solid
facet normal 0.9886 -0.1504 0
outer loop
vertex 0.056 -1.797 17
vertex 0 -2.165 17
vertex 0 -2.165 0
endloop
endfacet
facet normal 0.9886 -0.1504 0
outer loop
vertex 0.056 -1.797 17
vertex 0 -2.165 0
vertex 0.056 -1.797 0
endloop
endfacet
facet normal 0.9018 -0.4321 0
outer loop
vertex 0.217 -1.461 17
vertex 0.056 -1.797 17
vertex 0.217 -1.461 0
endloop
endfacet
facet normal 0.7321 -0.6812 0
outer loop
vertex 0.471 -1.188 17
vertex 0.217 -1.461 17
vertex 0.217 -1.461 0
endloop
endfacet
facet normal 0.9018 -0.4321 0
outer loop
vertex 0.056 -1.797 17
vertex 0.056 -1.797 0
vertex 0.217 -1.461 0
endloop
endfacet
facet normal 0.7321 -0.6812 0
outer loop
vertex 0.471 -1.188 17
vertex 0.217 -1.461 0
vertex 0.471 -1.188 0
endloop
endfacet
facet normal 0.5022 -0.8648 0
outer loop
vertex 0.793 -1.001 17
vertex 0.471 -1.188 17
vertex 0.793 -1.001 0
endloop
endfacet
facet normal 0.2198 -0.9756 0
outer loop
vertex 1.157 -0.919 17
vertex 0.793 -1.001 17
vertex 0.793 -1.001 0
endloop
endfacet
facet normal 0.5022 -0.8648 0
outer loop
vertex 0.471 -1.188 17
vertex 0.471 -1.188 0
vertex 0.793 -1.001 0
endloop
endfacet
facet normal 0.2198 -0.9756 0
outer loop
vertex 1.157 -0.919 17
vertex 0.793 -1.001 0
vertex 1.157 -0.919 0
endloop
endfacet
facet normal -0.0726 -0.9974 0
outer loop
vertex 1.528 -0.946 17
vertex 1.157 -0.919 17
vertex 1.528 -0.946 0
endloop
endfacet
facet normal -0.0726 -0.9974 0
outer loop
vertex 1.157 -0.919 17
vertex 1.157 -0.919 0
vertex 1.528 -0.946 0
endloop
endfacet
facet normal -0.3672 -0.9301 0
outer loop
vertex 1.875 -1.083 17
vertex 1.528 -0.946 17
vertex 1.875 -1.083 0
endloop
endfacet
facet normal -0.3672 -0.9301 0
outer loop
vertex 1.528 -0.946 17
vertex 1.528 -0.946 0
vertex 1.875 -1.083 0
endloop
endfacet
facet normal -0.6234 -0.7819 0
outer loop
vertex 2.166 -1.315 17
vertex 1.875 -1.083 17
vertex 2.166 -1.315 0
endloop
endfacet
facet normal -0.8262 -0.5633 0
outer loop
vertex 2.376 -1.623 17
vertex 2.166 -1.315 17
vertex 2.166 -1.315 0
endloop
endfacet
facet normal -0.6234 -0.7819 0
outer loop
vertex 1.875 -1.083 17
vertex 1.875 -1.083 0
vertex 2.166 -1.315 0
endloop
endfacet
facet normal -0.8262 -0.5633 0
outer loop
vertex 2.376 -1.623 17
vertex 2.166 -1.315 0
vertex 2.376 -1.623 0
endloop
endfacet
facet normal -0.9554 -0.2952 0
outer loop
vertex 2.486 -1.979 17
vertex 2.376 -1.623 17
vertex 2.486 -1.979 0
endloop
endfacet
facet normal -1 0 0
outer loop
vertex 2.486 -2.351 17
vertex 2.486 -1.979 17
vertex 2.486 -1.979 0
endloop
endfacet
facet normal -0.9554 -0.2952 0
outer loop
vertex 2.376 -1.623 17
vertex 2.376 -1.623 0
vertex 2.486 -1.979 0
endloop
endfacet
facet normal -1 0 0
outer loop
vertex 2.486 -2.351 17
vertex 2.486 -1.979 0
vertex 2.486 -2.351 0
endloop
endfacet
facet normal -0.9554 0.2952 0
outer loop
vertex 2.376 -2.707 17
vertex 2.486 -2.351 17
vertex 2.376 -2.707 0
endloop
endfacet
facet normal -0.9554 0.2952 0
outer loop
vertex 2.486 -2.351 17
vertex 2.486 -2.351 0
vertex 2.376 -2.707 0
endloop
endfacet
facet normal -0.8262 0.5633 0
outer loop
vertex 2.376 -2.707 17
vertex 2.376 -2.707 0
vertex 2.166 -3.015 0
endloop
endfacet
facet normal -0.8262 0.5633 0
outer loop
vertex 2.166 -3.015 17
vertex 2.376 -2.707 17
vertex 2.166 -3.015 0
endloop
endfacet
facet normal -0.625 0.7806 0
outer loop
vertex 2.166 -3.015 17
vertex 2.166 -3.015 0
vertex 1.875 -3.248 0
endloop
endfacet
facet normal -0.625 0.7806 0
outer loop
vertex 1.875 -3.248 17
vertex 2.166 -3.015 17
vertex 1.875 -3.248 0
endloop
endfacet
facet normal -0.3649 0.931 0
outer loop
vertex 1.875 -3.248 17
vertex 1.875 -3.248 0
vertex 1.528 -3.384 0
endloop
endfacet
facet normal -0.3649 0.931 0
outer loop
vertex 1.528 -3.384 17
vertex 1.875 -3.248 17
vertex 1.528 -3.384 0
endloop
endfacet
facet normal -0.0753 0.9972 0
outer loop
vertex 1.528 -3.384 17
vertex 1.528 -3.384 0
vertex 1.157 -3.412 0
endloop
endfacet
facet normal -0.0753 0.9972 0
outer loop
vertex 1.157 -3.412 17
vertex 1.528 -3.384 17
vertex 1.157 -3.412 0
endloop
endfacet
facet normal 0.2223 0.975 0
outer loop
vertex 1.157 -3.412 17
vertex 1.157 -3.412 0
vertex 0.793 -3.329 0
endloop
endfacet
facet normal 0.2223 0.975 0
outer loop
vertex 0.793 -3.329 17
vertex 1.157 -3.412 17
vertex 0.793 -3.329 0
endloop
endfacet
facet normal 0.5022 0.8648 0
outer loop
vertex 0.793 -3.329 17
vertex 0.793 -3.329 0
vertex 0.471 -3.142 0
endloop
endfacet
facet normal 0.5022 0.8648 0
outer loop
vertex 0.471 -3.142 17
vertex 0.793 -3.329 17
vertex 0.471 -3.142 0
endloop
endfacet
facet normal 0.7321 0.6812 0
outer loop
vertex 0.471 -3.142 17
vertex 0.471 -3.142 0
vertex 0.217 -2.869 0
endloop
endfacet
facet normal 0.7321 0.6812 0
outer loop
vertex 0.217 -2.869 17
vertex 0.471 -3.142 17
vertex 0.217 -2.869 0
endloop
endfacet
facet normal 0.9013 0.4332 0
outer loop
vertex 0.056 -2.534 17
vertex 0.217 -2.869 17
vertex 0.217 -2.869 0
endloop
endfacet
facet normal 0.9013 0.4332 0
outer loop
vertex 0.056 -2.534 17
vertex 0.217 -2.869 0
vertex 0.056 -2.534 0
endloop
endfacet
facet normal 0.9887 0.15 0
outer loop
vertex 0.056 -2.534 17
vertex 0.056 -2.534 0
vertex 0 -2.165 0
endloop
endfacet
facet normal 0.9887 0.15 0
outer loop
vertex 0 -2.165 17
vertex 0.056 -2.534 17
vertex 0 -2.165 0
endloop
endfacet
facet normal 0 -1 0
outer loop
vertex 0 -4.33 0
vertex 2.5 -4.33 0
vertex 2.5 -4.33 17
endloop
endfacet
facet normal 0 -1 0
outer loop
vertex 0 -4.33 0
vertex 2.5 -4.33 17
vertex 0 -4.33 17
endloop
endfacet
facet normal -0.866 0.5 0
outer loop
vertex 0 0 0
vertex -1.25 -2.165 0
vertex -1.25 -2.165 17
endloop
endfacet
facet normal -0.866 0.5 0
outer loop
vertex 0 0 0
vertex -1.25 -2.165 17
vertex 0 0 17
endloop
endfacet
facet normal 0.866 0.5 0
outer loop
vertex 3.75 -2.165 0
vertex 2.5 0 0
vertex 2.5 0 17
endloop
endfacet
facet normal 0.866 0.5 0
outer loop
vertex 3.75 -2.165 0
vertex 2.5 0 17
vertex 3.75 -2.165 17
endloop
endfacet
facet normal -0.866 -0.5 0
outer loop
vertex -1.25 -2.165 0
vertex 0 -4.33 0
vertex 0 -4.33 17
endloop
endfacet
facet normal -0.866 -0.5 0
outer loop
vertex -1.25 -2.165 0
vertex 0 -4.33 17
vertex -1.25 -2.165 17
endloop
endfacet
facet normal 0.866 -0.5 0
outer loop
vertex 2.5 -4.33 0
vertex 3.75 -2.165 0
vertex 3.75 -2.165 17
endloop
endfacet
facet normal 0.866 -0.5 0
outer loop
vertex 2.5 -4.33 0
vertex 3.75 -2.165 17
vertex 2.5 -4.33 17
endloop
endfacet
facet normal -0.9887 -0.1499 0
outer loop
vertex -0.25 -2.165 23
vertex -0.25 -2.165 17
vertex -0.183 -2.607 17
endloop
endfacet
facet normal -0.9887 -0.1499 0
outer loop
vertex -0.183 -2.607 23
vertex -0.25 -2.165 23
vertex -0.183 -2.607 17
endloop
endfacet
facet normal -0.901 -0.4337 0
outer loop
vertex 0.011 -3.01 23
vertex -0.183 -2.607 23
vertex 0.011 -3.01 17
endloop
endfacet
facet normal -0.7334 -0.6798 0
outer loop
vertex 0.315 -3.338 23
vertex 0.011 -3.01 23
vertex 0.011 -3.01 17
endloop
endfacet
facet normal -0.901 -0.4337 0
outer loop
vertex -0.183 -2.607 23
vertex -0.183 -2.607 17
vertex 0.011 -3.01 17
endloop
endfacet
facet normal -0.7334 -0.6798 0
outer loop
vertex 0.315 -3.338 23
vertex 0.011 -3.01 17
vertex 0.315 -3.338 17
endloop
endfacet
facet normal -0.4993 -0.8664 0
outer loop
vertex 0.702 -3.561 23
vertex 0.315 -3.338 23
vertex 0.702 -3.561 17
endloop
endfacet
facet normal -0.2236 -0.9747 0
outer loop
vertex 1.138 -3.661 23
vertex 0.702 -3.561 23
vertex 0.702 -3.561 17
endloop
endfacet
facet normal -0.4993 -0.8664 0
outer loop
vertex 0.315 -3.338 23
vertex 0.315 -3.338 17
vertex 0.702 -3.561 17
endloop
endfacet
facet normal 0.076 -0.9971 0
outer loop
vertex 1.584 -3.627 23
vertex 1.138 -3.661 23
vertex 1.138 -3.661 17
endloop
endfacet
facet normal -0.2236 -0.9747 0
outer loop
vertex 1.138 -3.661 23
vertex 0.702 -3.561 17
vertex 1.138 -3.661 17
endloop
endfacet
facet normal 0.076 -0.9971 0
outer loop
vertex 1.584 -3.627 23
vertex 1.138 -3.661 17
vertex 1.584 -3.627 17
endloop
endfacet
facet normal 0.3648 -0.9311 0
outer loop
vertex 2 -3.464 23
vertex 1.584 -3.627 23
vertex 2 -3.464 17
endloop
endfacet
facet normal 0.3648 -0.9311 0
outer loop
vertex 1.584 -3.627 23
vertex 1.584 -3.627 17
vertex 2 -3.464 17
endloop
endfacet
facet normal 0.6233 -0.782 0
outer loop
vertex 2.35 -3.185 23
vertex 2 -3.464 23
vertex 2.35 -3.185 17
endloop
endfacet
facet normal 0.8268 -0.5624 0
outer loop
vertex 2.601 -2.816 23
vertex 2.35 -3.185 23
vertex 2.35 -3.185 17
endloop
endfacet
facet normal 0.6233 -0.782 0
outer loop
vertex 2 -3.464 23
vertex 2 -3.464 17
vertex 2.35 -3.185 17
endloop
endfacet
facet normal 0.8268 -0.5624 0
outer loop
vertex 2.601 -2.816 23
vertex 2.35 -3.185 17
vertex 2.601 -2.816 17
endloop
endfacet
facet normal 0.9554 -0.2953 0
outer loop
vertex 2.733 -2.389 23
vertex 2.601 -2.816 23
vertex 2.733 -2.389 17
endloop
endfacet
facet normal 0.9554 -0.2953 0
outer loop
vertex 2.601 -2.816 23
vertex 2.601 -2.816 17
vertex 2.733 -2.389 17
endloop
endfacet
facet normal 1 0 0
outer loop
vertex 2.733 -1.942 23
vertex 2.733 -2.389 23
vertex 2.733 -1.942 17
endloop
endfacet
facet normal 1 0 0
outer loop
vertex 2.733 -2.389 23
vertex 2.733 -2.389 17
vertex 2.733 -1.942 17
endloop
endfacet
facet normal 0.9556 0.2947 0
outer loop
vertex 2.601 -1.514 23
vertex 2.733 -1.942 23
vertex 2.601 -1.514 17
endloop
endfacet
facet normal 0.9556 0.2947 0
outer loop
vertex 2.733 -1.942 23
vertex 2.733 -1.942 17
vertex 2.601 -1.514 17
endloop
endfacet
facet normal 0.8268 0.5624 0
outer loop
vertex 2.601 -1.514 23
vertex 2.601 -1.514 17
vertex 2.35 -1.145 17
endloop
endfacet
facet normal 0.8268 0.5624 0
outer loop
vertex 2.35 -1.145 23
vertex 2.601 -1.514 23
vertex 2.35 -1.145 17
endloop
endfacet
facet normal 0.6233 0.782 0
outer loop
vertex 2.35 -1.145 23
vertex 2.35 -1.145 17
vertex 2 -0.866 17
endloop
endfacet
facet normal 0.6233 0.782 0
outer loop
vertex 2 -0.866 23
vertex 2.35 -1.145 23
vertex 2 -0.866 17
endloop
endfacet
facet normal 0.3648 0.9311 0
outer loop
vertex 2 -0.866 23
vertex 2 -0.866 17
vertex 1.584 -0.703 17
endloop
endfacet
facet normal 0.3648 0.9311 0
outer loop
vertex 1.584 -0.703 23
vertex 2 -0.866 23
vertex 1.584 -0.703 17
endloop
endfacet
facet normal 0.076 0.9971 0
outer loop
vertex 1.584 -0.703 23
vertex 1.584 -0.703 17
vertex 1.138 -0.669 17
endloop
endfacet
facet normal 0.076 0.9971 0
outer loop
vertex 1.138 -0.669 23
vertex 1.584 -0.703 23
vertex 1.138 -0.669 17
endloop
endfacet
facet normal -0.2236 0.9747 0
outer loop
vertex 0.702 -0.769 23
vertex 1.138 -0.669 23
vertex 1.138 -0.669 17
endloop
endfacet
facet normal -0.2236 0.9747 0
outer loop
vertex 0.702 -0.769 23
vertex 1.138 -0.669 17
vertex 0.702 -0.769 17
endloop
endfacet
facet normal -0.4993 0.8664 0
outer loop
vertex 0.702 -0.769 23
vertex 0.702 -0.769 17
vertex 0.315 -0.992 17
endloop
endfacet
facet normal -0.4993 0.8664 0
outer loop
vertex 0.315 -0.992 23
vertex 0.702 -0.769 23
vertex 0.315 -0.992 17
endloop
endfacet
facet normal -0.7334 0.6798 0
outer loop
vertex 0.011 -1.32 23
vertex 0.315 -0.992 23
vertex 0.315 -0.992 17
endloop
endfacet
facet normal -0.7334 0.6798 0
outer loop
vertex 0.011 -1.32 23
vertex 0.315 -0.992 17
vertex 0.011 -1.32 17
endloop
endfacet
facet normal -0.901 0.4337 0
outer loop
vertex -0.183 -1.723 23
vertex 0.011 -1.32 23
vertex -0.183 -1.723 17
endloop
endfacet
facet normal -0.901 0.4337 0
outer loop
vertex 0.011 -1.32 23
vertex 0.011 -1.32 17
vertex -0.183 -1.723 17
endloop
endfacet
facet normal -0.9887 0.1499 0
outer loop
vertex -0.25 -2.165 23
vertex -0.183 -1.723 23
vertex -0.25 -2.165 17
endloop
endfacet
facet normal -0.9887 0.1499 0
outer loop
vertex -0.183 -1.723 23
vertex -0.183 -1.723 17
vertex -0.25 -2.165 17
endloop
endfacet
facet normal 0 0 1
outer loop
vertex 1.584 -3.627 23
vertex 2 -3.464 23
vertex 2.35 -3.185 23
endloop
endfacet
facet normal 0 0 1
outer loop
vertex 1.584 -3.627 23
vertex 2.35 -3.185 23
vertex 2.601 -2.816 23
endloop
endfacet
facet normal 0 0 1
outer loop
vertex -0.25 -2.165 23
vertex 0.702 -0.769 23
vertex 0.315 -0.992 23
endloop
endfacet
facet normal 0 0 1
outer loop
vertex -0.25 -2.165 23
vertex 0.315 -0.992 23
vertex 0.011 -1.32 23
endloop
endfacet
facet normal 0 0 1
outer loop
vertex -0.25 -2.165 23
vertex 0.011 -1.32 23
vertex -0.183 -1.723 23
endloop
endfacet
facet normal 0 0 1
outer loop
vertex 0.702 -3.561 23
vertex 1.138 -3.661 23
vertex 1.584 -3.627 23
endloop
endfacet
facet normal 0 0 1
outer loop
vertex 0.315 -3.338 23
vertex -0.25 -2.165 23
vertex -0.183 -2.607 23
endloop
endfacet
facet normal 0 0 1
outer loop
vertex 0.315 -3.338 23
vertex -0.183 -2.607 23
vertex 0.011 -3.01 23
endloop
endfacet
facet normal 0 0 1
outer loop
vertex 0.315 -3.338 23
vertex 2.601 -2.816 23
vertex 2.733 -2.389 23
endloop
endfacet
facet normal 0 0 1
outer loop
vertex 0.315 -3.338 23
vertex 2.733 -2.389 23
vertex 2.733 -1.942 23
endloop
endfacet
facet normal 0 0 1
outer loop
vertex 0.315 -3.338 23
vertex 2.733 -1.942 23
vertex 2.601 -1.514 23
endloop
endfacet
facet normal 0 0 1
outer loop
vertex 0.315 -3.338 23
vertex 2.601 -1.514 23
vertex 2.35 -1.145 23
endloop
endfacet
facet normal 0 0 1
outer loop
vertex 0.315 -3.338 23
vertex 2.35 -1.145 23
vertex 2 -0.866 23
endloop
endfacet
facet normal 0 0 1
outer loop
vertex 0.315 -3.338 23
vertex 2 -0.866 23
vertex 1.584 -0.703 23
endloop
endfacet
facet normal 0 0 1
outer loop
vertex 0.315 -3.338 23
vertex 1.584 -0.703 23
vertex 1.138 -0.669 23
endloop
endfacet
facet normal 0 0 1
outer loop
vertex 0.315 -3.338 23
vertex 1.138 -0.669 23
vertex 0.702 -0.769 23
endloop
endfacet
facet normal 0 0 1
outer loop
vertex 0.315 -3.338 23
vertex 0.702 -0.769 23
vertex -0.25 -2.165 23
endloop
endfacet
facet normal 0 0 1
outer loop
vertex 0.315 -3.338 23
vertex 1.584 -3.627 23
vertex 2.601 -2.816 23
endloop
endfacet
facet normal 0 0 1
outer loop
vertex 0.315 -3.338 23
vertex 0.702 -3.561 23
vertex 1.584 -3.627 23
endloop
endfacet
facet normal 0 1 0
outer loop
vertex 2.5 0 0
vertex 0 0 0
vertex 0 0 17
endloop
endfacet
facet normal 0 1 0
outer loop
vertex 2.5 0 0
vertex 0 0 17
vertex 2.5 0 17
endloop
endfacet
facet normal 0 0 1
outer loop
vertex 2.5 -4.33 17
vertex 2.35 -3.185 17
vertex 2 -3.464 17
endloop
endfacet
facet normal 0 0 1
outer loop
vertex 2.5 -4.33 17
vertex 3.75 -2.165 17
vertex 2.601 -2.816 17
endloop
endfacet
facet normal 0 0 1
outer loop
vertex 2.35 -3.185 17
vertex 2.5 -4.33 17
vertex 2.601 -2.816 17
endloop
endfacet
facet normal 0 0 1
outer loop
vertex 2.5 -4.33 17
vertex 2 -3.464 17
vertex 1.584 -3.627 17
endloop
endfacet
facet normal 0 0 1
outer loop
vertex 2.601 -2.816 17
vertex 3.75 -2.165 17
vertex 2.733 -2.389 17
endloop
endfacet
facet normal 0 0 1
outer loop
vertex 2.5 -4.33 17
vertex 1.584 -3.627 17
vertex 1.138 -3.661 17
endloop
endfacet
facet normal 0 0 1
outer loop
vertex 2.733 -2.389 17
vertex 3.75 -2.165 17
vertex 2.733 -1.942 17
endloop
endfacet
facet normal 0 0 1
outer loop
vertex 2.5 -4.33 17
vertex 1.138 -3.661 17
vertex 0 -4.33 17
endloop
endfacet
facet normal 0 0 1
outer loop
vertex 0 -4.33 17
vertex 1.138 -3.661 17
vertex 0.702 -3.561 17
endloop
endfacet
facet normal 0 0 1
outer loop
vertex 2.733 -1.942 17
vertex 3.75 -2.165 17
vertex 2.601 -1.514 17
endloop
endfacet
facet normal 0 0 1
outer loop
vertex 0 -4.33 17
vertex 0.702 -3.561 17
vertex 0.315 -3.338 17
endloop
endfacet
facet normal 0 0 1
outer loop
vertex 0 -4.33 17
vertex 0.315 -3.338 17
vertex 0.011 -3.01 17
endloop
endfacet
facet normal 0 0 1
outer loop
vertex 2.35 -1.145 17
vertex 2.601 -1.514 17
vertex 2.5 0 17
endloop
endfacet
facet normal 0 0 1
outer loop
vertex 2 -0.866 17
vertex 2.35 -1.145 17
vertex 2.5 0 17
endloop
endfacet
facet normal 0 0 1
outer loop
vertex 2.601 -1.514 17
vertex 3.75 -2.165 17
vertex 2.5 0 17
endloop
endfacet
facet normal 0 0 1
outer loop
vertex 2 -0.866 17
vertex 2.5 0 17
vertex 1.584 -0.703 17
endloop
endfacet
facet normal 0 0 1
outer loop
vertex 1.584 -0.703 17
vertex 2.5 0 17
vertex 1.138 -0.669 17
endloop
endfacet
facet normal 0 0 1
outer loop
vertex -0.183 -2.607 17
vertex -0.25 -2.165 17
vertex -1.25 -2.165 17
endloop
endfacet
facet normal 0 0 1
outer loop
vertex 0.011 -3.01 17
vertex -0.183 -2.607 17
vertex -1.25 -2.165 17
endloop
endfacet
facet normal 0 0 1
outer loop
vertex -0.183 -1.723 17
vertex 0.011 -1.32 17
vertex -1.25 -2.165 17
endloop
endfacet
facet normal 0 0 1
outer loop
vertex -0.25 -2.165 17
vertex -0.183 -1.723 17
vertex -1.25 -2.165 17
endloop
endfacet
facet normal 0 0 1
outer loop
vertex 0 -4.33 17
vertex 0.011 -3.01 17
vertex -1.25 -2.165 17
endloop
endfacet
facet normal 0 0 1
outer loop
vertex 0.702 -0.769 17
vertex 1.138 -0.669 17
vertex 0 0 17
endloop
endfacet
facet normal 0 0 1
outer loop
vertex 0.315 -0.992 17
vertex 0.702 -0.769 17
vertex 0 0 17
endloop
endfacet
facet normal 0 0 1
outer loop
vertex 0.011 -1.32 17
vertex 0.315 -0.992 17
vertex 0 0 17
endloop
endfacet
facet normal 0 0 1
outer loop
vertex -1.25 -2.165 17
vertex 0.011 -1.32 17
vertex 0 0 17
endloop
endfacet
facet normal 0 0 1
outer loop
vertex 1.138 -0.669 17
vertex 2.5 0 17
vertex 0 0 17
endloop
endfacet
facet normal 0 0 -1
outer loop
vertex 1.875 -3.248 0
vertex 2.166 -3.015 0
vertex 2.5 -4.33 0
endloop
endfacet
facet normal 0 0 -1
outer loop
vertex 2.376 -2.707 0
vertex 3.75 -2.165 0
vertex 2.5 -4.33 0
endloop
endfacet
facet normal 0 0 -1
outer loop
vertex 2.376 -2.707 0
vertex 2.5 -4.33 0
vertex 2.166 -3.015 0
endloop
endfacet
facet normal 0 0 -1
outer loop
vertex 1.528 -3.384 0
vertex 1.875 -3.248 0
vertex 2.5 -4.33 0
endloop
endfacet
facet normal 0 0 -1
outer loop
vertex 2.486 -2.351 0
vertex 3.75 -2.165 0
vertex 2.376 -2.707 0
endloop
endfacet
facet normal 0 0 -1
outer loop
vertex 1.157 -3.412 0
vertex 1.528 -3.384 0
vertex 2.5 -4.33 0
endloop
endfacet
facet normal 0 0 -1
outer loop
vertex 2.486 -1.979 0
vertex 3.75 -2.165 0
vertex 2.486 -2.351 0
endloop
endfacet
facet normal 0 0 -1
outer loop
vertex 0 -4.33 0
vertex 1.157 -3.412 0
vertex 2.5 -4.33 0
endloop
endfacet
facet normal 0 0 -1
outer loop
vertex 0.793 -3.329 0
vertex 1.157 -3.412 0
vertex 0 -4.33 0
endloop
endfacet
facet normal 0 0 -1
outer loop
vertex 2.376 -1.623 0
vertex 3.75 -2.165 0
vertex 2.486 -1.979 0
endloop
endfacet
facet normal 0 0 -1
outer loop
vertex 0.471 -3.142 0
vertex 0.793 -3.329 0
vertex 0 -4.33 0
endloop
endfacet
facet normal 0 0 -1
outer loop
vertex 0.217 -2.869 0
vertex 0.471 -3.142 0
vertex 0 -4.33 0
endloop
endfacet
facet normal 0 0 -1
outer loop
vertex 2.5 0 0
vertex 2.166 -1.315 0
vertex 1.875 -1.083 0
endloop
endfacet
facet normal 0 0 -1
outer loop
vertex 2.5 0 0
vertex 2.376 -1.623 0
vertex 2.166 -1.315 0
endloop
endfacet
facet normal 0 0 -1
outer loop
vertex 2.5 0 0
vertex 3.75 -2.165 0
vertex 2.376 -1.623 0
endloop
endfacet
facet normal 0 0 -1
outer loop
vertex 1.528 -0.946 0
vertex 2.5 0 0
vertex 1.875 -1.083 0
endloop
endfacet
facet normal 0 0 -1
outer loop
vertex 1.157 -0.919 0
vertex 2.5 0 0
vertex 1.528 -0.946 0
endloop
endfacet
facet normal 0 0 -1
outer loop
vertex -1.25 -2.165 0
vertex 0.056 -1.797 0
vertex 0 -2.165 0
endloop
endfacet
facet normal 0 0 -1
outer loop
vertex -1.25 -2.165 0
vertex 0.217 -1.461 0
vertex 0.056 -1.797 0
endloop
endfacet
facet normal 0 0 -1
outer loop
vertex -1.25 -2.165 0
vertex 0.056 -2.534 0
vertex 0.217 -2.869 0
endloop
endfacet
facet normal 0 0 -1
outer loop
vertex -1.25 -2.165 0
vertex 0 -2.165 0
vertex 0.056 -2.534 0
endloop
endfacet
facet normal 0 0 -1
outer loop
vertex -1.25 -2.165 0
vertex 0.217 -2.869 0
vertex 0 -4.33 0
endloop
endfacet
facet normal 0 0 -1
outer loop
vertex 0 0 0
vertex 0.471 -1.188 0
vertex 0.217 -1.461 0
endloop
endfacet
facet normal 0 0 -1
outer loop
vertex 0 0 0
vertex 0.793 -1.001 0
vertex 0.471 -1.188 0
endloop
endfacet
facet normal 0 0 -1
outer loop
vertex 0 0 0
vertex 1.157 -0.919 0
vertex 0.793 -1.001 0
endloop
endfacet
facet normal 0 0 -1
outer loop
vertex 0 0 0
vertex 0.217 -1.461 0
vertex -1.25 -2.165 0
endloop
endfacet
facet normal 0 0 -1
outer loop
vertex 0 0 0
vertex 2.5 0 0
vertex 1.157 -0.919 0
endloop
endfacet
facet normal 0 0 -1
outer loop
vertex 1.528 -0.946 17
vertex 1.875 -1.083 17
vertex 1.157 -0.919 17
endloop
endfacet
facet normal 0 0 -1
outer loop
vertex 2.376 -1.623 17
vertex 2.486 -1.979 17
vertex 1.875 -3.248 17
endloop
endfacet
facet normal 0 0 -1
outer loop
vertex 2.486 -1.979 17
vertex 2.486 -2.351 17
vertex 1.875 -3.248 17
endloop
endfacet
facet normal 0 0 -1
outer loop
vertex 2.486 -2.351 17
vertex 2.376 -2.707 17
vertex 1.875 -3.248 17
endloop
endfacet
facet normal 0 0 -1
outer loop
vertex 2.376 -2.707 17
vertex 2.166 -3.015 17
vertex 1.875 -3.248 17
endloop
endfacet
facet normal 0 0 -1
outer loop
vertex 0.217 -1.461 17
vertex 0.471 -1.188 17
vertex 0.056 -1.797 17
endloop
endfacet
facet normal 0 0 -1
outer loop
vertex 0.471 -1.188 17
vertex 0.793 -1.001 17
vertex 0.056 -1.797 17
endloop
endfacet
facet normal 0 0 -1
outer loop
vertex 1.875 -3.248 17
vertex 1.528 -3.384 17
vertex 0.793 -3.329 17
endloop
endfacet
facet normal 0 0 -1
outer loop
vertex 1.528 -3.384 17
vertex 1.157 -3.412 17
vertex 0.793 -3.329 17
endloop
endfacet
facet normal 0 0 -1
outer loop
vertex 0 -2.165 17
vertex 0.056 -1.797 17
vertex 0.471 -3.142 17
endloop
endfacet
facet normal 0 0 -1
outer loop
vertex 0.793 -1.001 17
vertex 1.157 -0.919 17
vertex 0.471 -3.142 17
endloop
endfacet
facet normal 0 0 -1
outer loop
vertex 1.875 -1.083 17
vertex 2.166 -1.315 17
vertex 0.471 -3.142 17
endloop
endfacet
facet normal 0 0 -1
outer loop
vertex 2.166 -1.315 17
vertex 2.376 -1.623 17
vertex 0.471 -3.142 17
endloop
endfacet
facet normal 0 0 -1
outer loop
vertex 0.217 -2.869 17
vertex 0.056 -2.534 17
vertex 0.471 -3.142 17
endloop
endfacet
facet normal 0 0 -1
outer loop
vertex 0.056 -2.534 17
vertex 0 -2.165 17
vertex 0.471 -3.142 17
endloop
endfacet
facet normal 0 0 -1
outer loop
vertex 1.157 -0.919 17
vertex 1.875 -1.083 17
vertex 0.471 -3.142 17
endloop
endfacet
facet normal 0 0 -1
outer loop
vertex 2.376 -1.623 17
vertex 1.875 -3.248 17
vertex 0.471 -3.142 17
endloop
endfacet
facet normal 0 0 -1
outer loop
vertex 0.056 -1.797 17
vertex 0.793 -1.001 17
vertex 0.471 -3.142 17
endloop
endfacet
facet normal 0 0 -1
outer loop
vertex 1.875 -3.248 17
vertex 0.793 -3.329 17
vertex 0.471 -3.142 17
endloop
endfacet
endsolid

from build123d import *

# Parameters (mm, degrees)
EXTRUDE_1_DEPTH    = 17
HOLE_WIZARD_M3_1_D = 2.5
SKETCH_4_R         = 1.5
EXTRUDE_2_DEPTH    = 6


with BuildPart() as part:
    # 草图1 → 凸台-拉伸1 (new body)
    with BuildSketch(Plane.XY):
        Polygon((0, 0), (2.5, 0), (3.75, -2.165063509), (2.5, -4.330127019), (0, -4.330127019), (-1.25, -2.165063509), align=None)
    extrude(amount=EXTRUDE_1_DEPTH)

    # M3 螺纹孔1 (through all)
    with Locations(Plane.XY.offset(17)):
        with Locations((1.25, -2.165063509)):
            Hole(HOLE_WIZARD_M3_1_D / 2)

    # 草图4 → 凸台-拉伸2 (add)
    with BuildSketch(Plane.XY.offset(17)):
        with Locations(Location((1.25, -2.165063509, 0), (0, 0, 180))):
            Circle(SKETCH_4_R)
    extrude(amount=EXTRUDE_2_DEPTH)


solid = part.part
